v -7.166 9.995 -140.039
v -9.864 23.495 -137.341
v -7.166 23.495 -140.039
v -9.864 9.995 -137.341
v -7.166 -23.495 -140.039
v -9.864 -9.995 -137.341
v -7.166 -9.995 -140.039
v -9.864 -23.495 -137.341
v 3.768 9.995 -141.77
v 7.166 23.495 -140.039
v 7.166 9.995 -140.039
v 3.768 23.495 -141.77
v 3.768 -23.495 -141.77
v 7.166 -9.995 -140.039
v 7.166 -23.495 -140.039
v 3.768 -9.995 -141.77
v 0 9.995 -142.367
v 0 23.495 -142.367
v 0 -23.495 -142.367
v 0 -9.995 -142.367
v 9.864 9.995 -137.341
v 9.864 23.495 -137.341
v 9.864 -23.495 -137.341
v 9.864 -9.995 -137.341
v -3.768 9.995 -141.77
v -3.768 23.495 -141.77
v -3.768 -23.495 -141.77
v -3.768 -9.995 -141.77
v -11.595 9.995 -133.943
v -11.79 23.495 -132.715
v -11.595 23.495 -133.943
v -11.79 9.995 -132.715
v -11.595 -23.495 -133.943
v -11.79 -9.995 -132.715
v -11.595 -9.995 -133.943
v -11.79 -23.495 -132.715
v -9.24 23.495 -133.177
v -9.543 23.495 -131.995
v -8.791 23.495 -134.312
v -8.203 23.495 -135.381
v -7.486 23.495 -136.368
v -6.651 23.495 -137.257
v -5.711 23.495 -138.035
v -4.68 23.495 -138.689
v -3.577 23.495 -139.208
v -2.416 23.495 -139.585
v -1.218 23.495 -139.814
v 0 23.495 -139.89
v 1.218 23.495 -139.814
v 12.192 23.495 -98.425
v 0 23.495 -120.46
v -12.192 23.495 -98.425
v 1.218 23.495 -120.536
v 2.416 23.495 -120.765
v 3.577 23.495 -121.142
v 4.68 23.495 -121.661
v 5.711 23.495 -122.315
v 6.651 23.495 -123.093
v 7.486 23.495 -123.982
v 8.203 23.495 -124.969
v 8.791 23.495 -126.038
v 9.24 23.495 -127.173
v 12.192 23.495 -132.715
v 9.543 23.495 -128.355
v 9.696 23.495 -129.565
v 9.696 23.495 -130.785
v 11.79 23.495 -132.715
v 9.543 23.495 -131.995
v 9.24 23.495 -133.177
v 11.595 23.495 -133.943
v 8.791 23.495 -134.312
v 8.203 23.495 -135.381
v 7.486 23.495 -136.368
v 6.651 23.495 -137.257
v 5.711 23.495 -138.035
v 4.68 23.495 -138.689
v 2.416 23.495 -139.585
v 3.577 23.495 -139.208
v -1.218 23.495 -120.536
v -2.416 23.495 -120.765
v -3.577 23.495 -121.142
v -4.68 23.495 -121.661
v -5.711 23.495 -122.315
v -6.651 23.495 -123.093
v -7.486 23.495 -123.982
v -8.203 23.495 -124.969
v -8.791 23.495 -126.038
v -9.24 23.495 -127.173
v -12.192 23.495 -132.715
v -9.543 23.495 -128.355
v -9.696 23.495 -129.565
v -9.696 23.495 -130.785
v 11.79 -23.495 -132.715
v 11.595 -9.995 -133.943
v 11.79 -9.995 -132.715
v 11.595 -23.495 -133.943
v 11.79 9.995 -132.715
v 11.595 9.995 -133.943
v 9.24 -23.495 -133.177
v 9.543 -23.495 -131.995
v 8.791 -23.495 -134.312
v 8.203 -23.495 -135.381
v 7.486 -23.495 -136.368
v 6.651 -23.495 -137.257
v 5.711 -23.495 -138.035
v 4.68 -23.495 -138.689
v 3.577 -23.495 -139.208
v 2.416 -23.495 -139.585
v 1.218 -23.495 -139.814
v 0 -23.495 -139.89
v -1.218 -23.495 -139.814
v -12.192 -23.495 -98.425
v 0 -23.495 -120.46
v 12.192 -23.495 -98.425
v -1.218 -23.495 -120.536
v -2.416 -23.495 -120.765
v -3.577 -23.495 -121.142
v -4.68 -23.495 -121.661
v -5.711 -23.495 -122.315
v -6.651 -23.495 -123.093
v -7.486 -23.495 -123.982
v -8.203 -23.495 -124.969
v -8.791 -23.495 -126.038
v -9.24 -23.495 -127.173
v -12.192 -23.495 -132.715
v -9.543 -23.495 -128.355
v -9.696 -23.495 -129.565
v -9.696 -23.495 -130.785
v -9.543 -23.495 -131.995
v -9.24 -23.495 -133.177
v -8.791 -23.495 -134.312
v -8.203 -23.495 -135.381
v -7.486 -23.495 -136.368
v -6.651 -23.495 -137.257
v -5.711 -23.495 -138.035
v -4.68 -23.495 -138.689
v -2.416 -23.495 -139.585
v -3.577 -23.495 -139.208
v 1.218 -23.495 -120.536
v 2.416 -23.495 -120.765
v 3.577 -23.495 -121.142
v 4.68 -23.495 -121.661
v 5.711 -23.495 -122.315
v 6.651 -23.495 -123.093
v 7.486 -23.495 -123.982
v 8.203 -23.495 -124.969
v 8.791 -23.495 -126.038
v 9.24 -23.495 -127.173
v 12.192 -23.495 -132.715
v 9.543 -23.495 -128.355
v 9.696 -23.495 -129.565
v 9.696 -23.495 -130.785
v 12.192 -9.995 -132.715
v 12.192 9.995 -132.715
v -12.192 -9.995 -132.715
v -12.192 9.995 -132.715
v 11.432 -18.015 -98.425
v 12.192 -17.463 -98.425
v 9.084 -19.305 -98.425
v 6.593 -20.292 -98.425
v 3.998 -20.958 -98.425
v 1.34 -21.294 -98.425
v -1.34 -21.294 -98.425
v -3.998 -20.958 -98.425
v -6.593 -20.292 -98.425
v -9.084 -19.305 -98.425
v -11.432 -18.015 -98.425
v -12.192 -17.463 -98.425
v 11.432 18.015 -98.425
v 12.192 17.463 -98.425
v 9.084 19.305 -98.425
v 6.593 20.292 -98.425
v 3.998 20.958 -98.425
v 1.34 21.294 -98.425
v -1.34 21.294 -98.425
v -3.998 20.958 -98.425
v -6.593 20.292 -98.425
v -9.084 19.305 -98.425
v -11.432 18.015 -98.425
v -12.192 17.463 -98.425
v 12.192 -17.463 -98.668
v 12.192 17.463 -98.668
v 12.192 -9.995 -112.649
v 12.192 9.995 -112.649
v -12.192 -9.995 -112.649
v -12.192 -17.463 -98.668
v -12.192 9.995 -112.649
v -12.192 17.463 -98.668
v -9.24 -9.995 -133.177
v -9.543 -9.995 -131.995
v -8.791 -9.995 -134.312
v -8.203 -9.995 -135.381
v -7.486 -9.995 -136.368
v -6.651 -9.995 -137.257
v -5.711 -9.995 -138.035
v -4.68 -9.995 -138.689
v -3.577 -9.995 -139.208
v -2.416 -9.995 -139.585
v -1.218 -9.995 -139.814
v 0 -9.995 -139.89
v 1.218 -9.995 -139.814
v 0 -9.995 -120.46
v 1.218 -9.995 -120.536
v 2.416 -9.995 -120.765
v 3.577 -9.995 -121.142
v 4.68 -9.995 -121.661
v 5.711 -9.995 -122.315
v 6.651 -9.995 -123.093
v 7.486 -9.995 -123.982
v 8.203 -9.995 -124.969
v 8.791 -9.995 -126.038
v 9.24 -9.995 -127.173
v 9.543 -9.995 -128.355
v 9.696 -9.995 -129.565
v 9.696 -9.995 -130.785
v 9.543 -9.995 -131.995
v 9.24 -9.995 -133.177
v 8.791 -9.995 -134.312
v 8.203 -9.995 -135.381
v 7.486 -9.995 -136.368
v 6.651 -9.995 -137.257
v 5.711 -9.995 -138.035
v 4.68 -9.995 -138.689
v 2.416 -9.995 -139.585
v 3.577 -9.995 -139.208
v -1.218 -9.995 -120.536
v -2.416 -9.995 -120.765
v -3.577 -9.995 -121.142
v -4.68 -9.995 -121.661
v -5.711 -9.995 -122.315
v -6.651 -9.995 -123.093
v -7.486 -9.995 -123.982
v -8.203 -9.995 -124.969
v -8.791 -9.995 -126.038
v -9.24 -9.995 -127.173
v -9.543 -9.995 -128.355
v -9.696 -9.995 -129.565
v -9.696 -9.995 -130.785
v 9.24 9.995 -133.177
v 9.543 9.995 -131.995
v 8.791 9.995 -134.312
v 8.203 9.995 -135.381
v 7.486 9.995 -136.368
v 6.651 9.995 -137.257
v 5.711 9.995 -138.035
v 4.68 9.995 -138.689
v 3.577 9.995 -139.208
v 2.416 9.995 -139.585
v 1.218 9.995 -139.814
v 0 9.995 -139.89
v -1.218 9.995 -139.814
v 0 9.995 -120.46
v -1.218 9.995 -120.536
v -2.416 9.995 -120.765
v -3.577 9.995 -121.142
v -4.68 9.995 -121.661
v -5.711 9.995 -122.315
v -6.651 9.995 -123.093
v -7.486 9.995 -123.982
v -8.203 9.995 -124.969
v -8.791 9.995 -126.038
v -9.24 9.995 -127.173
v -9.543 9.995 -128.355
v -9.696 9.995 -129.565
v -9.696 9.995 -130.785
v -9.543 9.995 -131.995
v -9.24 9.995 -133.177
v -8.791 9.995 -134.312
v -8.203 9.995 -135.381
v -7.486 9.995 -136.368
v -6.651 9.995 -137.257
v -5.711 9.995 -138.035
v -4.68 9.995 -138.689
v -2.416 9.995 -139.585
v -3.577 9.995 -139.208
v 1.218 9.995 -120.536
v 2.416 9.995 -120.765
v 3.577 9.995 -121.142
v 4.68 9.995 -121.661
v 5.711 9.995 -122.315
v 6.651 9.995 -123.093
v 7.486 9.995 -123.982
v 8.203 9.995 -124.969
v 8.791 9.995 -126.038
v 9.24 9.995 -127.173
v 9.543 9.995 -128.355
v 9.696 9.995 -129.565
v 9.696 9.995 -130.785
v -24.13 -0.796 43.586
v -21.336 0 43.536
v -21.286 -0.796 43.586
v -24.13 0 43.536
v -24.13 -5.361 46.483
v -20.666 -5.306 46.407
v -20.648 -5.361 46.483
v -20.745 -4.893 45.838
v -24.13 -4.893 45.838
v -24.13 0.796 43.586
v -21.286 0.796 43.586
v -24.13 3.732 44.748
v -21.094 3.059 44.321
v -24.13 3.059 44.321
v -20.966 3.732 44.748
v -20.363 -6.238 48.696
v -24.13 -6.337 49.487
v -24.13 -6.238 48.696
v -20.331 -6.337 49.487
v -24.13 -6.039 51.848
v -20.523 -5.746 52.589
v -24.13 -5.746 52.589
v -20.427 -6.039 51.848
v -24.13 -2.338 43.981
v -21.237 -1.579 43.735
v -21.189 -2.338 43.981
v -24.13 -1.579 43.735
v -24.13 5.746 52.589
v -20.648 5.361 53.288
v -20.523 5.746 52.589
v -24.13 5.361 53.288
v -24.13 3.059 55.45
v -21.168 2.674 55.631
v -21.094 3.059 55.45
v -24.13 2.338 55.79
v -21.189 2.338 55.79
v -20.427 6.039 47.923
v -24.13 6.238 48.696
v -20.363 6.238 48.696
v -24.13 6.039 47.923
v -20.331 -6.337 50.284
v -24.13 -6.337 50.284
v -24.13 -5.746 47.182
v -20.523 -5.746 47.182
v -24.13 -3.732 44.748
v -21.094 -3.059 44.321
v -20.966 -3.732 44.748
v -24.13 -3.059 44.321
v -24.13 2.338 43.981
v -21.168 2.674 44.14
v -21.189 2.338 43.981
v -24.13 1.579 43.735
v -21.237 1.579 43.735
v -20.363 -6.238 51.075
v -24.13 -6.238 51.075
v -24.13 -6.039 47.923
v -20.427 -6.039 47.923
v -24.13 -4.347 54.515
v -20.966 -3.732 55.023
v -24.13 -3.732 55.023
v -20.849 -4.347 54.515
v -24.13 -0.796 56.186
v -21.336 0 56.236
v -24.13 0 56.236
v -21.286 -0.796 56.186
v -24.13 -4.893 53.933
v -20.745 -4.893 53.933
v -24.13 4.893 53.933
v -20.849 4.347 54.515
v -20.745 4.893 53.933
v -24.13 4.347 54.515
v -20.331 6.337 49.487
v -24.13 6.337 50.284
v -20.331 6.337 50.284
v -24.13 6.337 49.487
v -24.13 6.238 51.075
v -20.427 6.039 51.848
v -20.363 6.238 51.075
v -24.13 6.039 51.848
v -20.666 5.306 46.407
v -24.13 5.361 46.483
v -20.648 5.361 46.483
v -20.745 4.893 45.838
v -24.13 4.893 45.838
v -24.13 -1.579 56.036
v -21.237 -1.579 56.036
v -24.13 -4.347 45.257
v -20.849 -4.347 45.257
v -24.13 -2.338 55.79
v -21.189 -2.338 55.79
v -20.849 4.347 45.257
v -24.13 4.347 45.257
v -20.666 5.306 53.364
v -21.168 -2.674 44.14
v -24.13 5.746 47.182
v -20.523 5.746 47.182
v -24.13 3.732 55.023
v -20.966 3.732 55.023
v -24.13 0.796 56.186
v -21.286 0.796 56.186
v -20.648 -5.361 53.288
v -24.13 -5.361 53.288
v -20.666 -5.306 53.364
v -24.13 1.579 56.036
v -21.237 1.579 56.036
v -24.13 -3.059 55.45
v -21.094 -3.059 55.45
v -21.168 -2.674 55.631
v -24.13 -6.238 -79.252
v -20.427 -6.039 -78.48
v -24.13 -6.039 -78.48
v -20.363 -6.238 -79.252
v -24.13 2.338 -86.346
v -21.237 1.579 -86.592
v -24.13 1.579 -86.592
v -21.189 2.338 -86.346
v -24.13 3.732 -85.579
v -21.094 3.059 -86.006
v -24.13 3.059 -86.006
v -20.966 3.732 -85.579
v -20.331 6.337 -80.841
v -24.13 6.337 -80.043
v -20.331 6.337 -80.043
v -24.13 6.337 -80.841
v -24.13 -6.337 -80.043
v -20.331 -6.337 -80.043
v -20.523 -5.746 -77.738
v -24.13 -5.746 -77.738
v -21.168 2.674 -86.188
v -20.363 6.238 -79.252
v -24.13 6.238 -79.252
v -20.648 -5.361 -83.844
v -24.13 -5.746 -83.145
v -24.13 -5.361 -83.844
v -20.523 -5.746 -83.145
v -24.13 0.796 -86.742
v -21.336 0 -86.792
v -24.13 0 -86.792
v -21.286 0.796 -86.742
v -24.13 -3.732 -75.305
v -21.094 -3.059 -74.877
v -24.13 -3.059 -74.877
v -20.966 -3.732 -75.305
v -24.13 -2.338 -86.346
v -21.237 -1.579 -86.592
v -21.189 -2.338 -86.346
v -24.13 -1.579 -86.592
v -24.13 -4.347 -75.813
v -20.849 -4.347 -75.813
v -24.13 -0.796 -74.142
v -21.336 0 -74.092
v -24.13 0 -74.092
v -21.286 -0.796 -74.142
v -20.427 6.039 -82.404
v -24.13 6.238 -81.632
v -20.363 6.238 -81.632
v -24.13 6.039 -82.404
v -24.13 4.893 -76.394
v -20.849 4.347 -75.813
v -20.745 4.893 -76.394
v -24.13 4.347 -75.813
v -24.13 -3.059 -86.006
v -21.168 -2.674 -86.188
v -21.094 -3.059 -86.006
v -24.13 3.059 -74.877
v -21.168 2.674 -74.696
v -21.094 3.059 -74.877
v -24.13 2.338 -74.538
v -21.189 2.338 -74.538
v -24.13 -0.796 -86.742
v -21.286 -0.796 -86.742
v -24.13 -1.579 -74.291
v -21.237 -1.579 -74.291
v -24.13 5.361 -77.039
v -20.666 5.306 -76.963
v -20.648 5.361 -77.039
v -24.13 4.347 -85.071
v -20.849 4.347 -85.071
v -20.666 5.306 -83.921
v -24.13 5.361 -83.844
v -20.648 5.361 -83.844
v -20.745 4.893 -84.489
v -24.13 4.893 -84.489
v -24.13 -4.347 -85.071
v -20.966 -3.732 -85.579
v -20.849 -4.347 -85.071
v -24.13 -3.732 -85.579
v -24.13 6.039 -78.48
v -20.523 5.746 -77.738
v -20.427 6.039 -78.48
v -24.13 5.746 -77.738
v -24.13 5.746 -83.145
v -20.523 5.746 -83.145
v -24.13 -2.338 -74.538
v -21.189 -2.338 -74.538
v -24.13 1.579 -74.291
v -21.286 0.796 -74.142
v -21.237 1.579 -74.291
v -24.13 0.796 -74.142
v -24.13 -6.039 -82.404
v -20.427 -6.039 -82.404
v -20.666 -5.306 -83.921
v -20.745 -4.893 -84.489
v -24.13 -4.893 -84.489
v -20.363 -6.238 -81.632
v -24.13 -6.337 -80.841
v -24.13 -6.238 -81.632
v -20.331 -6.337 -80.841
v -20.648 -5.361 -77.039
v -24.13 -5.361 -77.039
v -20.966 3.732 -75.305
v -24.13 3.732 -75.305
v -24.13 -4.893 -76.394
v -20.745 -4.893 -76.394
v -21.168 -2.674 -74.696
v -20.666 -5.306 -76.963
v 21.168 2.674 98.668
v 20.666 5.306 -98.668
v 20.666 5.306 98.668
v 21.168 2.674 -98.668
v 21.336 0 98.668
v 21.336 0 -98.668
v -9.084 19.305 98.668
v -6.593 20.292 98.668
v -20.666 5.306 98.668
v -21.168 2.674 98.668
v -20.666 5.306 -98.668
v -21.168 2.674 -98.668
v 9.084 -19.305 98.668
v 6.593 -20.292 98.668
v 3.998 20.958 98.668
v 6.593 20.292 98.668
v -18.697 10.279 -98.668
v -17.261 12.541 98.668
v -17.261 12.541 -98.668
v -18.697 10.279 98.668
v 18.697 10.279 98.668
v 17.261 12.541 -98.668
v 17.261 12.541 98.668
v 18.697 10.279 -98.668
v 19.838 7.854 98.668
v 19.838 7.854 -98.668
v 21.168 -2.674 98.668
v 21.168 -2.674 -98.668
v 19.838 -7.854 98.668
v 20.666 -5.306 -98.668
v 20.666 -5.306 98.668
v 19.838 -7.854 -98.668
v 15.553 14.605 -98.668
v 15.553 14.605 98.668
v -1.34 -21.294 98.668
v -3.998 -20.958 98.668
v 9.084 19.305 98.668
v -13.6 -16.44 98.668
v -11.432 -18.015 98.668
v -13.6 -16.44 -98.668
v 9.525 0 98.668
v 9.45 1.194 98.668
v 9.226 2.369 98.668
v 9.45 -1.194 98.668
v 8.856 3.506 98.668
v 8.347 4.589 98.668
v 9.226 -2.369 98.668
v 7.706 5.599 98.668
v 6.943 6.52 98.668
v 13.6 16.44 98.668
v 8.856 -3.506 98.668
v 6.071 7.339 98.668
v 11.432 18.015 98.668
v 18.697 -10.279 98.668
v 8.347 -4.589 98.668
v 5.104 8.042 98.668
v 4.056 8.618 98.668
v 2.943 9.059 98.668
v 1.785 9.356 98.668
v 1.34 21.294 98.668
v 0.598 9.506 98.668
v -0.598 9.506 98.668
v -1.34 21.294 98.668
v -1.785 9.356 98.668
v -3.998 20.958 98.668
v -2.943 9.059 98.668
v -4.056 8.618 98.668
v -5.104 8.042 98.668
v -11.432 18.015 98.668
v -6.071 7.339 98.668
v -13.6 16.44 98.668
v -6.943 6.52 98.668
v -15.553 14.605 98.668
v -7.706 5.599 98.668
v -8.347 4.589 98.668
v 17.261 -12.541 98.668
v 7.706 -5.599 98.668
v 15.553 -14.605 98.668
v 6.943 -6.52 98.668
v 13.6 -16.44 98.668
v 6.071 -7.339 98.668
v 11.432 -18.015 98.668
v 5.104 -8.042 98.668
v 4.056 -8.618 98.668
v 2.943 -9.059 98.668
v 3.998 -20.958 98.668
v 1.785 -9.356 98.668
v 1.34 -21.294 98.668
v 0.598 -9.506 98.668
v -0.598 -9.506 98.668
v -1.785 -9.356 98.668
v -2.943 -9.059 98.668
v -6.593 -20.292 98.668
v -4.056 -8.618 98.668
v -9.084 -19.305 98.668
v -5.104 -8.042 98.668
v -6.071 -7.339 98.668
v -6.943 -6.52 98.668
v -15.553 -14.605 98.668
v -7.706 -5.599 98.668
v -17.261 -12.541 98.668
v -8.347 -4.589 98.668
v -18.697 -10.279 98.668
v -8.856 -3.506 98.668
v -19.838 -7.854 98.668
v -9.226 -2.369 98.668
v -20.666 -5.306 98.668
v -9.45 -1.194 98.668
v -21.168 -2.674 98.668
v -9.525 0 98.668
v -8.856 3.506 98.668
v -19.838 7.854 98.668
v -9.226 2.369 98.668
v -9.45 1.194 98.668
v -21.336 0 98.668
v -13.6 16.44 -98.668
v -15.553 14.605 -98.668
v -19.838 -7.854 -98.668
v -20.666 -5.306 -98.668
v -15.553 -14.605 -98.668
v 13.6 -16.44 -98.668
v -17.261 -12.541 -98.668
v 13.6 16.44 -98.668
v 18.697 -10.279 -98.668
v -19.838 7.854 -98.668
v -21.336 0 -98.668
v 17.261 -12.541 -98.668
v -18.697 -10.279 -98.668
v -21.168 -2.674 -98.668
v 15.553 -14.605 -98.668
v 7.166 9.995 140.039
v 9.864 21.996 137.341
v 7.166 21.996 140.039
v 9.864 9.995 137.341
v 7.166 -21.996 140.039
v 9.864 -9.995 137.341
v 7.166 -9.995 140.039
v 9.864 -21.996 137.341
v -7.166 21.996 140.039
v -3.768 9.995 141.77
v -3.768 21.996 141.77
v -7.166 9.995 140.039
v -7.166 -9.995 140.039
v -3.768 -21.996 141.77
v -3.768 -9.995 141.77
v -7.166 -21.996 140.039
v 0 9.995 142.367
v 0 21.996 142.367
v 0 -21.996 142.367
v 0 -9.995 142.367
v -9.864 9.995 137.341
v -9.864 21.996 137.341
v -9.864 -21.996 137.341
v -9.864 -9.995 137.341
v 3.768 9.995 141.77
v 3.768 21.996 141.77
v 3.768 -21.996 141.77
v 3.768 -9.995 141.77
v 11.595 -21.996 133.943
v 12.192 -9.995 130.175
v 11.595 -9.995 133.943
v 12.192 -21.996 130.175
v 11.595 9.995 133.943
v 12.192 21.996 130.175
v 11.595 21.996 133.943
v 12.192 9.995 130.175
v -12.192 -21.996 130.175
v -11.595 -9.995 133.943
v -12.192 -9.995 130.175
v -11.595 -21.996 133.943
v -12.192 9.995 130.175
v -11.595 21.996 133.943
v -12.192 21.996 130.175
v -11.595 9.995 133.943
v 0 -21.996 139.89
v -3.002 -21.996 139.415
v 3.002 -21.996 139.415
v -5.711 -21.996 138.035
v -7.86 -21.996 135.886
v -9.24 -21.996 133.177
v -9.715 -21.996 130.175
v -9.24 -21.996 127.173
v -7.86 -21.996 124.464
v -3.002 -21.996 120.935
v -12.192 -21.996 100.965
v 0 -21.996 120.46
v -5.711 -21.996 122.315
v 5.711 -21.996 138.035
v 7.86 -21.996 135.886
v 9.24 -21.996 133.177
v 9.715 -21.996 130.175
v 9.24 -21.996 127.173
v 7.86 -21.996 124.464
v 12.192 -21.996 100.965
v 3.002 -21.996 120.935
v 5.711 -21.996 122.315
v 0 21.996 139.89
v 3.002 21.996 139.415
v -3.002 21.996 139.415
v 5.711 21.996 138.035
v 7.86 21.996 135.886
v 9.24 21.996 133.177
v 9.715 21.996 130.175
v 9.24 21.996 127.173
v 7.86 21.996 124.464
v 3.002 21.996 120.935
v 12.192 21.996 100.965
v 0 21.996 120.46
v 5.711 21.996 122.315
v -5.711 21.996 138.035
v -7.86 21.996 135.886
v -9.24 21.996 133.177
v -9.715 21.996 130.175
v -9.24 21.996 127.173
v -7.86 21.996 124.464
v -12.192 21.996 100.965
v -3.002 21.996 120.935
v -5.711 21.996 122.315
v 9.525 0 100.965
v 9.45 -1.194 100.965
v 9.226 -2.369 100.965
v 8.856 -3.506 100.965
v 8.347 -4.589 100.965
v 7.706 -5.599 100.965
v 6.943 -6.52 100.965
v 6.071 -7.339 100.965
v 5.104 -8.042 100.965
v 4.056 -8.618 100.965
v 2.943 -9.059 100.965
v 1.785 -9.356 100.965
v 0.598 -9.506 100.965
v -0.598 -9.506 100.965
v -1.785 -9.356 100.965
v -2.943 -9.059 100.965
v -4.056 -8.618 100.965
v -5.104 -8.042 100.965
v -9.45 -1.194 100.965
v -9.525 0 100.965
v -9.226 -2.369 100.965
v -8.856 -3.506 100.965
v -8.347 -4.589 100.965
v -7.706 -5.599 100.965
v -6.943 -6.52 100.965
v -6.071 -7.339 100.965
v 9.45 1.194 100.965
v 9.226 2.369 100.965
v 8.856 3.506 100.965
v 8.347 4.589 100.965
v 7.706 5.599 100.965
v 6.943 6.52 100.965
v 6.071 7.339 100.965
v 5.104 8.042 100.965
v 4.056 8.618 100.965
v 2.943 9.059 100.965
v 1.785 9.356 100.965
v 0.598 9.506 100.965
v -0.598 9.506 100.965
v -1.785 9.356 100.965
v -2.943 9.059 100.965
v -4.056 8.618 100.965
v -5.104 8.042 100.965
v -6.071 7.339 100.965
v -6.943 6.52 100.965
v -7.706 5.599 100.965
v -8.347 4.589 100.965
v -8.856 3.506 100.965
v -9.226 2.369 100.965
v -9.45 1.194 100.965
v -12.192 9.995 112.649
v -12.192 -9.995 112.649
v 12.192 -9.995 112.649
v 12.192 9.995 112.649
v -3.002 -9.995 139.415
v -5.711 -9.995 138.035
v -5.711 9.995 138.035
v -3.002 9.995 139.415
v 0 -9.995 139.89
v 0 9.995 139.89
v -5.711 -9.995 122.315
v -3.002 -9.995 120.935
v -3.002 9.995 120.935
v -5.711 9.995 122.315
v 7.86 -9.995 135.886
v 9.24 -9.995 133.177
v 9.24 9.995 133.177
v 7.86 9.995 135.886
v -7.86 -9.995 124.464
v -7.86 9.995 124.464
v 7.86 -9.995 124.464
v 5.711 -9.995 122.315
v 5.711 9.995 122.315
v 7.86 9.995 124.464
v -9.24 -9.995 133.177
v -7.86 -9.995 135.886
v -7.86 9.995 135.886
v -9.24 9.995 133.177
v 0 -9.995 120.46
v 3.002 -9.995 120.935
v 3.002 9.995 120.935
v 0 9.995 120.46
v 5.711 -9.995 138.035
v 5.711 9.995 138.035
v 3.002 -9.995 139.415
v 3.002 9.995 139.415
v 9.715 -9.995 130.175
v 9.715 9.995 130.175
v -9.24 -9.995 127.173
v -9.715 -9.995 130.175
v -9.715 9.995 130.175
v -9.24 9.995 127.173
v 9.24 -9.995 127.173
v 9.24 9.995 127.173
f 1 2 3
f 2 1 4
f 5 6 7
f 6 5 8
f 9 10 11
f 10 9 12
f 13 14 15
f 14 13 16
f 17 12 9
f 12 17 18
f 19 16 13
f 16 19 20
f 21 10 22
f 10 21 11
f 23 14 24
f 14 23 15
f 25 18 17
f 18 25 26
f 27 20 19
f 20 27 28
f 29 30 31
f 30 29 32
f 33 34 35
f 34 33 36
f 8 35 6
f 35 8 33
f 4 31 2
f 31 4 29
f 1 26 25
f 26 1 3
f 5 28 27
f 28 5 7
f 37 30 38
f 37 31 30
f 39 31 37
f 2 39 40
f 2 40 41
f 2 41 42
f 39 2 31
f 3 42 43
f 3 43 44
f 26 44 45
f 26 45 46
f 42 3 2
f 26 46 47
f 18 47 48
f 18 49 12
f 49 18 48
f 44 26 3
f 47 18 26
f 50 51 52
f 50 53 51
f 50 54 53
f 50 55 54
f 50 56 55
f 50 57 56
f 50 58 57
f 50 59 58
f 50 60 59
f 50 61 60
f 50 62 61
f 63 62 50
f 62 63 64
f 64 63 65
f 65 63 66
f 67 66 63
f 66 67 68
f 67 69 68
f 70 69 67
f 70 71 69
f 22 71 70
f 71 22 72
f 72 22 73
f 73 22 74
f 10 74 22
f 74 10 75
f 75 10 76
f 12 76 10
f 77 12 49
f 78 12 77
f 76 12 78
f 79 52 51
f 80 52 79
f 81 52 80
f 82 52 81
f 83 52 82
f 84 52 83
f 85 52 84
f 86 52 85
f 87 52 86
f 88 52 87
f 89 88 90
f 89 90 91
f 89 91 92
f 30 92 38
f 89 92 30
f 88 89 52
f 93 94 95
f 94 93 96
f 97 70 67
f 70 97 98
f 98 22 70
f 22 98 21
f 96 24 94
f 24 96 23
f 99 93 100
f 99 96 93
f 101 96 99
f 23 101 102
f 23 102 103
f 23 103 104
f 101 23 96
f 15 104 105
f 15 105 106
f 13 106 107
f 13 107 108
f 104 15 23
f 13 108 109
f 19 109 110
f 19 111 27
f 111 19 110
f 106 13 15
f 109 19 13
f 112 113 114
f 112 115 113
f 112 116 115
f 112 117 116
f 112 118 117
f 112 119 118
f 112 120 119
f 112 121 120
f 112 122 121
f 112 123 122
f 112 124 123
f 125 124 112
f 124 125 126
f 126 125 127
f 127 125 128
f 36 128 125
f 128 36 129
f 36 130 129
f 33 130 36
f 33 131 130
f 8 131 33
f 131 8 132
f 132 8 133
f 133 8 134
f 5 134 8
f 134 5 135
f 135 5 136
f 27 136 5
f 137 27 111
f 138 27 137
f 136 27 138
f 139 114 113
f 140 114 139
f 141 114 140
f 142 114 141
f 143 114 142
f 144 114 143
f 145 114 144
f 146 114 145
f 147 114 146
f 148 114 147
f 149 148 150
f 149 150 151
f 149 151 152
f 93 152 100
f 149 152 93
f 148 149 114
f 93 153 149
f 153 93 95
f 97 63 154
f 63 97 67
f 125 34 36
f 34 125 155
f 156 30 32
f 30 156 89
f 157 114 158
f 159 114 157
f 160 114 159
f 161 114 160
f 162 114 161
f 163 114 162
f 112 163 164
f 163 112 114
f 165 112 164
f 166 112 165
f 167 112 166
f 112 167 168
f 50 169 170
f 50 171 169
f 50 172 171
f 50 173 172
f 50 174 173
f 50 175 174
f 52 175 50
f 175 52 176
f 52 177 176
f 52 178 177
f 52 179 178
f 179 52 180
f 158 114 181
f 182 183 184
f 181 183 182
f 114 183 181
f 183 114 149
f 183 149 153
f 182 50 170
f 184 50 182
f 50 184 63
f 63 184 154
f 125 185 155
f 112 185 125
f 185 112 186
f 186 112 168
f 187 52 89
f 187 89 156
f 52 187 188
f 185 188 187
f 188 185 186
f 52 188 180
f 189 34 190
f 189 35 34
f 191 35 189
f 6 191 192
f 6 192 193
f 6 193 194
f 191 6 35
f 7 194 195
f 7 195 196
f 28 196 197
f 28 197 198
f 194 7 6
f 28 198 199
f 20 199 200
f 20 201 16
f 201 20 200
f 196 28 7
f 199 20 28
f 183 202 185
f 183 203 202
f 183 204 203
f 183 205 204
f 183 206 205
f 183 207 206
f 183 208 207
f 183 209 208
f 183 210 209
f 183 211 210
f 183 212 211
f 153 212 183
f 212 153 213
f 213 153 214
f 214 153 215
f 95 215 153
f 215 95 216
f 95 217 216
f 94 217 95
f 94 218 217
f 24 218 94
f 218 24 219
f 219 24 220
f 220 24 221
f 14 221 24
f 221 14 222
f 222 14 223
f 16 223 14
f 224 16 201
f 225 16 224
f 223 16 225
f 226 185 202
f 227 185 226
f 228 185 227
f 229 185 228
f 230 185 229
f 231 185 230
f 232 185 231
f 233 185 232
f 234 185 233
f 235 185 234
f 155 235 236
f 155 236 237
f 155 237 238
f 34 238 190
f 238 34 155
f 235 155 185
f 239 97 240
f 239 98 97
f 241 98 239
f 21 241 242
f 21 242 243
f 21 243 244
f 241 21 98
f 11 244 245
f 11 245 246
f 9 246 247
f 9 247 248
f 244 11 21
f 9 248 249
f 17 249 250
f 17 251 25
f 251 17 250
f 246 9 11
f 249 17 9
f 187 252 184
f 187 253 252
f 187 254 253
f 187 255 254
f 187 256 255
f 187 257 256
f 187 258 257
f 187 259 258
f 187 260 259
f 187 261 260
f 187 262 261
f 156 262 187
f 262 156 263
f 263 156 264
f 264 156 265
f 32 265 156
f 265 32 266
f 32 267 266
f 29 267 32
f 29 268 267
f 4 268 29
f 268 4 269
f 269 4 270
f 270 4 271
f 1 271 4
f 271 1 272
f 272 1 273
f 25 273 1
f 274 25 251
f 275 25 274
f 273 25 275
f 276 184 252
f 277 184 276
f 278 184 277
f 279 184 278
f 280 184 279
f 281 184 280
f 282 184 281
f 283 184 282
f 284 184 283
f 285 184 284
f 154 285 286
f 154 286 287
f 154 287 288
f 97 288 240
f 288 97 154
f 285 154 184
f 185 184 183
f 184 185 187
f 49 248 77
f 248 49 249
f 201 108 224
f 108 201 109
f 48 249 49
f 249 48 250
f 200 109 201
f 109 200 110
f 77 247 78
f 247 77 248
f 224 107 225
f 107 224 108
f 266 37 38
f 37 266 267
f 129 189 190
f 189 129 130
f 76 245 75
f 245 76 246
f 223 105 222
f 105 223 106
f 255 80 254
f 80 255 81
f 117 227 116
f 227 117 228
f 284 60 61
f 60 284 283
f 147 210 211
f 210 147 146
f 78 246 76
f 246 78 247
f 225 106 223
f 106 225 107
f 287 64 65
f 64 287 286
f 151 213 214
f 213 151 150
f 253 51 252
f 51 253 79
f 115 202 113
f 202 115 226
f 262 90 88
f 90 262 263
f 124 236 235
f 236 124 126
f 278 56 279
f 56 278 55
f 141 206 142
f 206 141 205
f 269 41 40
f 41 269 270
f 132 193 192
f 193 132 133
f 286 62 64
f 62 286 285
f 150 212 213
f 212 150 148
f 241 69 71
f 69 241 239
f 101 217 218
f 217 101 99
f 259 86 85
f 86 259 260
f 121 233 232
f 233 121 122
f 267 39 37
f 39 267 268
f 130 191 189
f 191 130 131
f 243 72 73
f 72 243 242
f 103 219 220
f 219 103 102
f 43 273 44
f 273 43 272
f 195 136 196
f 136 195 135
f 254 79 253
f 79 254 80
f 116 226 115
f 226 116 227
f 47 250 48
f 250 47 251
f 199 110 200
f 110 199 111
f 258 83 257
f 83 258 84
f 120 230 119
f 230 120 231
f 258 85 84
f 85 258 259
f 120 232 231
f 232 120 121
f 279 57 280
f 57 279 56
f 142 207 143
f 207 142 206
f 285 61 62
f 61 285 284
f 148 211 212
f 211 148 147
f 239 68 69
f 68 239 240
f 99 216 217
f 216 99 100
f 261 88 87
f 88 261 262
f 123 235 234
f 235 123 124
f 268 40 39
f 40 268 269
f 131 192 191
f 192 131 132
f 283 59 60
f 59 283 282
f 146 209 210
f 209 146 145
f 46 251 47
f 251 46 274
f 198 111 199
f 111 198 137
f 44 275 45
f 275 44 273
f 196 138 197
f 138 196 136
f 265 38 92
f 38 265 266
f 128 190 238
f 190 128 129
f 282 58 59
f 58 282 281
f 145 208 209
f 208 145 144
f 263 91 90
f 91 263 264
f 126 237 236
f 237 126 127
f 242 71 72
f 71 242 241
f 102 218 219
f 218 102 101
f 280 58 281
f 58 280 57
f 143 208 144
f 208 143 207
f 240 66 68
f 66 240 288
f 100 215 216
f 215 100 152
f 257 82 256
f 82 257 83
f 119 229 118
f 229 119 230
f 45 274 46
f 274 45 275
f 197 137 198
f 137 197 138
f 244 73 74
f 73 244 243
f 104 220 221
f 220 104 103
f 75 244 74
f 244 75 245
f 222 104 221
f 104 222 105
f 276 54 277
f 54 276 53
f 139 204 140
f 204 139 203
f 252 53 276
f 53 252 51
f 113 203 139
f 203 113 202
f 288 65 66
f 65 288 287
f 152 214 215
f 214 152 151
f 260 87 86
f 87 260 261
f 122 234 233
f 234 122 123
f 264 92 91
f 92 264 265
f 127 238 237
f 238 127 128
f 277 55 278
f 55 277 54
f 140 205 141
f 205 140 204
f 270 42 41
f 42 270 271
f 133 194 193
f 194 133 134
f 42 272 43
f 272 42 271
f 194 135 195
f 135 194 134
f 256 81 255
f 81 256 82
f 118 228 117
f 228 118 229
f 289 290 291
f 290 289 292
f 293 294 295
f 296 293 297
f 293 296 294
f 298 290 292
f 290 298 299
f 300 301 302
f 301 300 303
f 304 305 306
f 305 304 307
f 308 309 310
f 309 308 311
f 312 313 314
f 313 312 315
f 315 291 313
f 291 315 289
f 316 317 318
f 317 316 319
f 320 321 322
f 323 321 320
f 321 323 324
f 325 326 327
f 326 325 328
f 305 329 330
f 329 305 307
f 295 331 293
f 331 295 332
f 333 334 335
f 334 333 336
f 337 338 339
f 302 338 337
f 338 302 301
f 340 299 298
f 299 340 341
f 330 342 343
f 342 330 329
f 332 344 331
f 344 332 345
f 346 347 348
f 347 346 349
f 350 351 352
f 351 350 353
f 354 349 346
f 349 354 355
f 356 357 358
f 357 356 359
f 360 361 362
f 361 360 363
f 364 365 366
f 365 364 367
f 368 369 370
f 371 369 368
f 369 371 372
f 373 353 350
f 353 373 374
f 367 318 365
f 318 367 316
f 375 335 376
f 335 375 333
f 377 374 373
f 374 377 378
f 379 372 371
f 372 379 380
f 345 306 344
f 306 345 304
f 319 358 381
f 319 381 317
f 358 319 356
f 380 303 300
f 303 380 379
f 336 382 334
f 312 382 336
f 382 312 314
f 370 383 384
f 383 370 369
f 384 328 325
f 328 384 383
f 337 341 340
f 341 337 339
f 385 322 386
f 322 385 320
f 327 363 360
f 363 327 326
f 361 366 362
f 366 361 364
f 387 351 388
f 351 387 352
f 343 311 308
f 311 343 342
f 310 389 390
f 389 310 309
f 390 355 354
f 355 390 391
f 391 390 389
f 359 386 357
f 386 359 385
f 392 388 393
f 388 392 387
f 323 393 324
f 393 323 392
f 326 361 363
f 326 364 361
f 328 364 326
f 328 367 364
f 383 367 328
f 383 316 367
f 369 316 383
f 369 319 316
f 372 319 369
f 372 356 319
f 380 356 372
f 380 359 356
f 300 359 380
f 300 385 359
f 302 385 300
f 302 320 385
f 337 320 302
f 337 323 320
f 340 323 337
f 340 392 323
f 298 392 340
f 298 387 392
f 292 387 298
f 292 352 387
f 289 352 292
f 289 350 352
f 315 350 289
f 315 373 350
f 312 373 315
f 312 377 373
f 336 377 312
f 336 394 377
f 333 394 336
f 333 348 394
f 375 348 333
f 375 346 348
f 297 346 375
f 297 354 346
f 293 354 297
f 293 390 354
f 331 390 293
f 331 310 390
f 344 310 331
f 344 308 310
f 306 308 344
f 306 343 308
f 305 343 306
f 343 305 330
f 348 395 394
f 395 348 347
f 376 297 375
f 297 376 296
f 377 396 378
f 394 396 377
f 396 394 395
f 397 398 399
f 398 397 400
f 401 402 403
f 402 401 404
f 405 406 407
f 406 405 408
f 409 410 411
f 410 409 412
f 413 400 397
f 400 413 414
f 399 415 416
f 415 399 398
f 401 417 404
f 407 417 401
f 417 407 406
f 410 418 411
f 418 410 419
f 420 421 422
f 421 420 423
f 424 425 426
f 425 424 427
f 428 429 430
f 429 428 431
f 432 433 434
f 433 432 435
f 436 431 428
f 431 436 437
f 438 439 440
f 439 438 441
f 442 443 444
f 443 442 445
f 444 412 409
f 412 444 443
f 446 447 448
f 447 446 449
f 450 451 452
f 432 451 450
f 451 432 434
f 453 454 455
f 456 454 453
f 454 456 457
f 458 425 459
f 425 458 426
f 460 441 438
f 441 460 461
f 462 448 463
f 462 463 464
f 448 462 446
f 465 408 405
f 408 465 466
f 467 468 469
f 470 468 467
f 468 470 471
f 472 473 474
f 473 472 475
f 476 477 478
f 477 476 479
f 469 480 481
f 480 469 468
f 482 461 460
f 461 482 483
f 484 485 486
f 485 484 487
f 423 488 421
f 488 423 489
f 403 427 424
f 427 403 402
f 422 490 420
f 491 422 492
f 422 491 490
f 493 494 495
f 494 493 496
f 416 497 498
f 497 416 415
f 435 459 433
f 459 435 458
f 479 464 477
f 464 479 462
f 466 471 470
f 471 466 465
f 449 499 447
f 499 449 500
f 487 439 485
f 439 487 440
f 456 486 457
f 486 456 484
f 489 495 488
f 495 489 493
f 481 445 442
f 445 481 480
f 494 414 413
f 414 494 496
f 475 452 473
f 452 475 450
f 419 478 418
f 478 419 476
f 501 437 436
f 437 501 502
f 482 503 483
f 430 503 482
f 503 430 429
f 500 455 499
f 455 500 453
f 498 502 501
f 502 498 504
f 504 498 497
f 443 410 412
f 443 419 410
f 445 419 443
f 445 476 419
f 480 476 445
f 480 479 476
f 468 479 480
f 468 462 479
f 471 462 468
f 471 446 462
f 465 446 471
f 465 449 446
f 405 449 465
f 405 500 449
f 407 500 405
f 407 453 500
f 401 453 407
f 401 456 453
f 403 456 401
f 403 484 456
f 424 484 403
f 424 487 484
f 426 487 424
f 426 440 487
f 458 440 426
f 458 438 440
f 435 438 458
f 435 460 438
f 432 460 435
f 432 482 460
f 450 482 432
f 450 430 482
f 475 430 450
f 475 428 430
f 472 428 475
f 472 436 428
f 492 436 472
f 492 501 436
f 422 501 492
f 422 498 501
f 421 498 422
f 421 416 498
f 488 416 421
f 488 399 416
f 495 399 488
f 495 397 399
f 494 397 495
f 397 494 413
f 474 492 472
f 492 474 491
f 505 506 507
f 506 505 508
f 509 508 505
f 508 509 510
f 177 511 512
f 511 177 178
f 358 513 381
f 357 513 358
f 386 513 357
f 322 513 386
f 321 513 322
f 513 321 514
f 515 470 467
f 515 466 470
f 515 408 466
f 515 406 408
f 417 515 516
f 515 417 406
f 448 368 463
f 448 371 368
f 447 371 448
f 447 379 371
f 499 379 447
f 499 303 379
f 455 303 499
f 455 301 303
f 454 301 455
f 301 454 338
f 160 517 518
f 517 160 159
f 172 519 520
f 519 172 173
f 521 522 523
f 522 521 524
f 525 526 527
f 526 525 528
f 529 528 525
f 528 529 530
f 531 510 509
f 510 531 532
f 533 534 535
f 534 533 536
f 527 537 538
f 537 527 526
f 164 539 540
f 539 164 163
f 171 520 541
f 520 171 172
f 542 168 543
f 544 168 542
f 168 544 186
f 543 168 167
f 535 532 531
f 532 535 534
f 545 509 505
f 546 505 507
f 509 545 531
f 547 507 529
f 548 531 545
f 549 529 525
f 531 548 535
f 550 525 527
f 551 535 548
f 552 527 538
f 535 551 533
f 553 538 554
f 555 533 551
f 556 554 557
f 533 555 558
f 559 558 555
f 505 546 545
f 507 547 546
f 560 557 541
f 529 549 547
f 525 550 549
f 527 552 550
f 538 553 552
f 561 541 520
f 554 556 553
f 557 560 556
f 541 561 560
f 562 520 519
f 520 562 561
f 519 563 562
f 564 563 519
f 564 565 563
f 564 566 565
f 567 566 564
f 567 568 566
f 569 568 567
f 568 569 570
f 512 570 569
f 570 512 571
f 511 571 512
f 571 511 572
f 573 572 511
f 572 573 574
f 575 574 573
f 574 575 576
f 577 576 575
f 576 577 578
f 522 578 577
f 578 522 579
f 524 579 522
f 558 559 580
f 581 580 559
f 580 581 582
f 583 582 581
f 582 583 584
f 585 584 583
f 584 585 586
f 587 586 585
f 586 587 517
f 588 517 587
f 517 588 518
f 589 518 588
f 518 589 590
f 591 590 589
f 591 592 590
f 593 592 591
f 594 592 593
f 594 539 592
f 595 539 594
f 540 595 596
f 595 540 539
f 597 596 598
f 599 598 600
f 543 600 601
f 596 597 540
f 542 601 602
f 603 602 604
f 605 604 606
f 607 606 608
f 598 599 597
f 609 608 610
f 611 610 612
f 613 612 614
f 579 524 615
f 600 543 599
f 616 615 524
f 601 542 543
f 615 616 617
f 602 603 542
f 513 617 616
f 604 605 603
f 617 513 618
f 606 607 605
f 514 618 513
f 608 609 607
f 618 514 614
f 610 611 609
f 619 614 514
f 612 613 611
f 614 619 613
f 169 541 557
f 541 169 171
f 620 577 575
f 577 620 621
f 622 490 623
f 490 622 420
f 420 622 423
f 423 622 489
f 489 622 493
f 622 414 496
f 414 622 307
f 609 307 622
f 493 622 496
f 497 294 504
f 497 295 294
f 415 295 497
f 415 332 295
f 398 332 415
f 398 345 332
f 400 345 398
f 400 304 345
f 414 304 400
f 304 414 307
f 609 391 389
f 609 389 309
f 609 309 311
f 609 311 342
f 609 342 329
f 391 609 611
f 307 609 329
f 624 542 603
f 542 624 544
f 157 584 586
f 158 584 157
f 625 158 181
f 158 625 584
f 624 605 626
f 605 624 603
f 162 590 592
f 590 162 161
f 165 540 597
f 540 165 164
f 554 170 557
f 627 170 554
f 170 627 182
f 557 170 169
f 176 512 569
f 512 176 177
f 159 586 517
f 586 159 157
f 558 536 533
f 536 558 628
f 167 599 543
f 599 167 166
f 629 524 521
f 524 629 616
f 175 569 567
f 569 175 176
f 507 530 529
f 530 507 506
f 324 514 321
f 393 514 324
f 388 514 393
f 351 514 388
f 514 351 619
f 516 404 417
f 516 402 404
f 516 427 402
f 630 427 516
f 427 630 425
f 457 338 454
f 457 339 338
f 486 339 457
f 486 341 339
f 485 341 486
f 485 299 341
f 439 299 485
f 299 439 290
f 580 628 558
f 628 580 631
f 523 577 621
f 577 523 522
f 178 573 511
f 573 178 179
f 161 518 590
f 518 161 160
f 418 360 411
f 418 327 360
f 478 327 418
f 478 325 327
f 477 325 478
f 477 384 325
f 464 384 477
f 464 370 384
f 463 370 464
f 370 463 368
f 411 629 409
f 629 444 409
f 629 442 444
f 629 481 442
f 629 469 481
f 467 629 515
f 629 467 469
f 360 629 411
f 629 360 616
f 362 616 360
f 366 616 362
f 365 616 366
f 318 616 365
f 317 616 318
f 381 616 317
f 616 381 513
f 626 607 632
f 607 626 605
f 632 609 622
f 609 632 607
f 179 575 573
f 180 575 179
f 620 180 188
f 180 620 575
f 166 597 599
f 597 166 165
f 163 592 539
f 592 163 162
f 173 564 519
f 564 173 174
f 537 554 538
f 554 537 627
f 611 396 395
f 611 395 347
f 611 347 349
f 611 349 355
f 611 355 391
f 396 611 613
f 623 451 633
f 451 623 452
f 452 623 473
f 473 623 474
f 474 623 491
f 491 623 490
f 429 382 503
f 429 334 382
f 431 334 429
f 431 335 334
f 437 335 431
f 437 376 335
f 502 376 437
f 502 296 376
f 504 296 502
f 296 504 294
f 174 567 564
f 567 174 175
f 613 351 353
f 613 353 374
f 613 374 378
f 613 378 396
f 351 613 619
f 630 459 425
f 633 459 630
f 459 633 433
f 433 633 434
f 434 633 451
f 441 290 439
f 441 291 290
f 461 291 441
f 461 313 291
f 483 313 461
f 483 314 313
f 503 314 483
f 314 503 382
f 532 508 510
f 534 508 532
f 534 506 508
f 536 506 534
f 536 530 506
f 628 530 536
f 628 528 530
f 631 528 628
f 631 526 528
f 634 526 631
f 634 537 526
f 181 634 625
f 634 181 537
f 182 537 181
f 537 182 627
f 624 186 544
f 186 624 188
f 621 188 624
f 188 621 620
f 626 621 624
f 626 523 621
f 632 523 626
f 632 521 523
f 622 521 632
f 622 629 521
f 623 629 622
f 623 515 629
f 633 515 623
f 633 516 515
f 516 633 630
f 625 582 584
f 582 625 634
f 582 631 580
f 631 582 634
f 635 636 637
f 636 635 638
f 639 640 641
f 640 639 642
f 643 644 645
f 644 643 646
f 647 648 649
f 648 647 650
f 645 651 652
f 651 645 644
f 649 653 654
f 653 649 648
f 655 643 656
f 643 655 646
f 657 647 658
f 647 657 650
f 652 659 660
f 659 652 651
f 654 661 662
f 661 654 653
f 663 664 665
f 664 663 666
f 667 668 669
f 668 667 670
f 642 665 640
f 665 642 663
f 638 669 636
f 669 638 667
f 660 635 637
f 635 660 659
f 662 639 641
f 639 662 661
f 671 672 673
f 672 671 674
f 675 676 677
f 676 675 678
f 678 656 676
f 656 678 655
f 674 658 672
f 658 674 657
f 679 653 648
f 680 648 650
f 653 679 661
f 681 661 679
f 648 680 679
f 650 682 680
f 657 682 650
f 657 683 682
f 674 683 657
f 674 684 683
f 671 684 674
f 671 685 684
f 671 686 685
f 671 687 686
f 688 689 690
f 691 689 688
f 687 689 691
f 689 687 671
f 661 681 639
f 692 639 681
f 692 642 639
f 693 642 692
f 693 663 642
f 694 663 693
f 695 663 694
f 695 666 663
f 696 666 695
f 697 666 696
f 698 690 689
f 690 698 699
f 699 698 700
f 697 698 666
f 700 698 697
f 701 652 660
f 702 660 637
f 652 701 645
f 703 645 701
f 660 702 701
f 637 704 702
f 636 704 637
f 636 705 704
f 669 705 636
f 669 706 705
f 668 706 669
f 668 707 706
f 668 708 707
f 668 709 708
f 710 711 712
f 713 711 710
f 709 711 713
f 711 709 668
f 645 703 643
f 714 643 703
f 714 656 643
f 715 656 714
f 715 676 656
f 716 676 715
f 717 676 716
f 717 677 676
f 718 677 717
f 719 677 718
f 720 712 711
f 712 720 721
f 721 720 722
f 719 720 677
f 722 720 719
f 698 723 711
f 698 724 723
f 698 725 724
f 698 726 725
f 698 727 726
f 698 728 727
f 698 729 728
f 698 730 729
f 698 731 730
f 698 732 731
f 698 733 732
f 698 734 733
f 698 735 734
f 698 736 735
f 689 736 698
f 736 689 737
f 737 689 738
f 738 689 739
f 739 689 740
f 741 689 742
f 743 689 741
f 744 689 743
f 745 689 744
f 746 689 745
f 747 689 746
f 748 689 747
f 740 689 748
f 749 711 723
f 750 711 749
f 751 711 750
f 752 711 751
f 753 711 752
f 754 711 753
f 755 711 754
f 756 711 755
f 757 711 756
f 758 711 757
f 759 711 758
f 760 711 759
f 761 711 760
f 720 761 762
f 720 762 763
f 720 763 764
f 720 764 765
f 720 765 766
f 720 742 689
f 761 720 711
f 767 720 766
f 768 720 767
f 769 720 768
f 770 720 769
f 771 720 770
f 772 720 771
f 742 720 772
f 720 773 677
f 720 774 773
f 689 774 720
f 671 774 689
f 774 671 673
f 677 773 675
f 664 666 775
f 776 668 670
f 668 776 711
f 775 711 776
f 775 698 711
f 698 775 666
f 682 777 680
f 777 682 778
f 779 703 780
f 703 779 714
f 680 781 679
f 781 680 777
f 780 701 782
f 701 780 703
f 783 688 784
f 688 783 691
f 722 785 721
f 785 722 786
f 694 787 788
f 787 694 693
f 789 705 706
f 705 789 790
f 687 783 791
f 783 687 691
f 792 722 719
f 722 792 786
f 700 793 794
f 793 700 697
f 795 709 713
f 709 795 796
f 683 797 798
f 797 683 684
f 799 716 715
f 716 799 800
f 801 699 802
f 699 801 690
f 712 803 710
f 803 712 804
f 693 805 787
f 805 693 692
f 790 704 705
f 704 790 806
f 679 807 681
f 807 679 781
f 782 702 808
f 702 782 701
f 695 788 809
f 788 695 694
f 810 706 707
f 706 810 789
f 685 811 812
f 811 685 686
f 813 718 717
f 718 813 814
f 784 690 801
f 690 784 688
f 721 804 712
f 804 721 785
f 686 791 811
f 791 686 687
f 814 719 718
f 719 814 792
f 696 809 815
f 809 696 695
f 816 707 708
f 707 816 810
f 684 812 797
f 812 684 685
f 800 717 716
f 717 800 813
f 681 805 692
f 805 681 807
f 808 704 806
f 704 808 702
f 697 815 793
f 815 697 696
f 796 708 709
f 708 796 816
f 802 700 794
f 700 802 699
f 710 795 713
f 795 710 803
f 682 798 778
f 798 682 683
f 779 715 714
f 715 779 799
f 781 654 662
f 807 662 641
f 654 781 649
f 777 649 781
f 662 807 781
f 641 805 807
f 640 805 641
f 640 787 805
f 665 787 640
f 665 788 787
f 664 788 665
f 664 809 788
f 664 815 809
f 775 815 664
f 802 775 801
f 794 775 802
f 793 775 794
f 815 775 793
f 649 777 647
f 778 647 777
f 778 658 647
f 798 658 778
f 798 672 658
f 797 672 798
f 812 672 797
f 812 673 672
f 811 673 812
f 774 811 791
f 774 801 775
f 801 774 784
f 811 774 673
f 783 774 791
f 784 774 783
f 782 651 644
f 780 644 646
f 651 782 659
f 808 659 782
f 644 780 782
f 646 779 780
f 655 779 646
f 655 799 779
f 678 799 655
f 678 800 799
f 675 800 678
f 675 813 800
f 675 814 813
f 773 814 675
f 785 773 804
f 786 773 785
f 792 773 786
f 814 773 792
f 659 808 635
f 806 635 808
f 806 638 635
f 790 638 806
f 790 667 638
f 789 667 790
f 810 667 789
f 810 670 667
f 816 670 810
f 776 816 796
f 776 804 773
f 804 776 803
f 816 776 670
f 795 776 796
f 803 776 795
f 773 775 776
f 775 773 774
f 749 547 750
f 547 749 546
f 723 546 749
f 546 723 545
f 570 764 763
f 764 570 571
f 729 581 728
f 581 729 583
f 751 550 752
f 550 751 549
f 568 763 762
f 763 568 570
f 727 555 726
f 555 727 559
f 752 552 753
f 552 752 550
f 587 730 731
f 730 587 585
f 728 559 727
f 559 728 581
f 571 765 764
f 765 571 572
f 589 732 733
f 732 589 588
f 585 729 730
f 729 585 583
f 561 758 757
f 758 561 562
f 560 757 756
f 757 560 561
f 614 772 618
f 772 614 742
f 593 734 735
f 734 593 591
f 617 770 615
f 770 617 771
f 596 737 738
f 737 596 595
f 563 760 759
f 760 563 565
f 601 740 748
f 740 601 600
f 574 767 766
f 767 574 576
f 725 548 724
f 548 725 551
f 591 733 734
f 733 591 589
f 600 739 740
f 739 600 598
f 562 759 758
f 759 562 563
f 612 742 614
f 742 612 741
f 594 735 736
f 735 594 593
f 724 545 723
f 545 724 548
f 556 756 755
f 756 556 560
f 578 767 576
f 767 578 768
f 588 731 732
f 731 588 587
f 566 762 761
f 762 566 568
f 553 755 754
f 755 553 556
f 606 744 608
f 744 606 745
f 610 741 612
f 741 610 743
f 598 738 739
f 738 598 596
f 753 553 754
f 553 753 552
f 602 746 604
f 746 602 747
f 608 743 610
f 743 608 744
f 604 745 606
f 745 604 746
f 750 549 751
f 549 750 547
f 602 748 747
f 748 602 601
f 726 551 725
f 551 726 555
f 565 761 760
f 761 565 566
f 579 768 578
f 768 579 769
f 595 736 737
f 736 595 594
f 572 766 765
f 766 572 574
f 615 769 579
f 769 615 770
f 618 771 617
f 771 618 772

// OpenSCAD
/*
About the model: This is a simplified model of a hydraulc cylinder, with key properties to consider when designing and CADing you own model. It allows you to look into a catalog and change parameters, based on the model you select.
The refernece used to construct this specific model is the "Chieve WC Wlded Cylinders", available in 2012 Catalog 280 provided by Bailey.

How to change it:
1) You can directly change it here, or
2) Enable the customizer feature of openscad
*/

/* [General Parameters]*/
unit=25.4;
extended=false;
bore=1.5;
stroke=5;
//Length of the cylinder
a=10.250;
/* [Cylinder Body Parameters] */
b=0.18;
// rod diameter
d=0.75;
/*[rod mechanical link parameters]*/
h=0.787;
l=0.96;
r=0.765;
g=1.732;
j=1.15;
/*[cylinder mechanical link parameters]*/
o=0.787;
e=1.850;
n=0.9;
r_c_h=j+l;
/*[Distance of hydraulic ports]*/
k=2.125;
m=0.922;

/*[Hidden]*/
//Z axis connection
// Rod connection related variable
z=g-h/2;
//size of the body cylinder
body=a-m-j;//*[] put the variables
y=a-(n+n);


module main_mod(){

// Rod Connector construction
module rod_connector(args) {
	module m001(args) {
		cylinder(d=l, h=g, center=true, $fn = 20 );
		translate([-j/2, 0, 0]){
			/* cube(size=[j, l, g], center=true); */
			cube(size=[j, l, g], center=true);

		}

	}
	difference(){
		difference() {
			m001();
			cylinder(d=r, h=z+10, center=true, $fn = 20);
		}
		cube(size=[j+j*0.2, j+j, h], center=true);
	}

}
// Lower Body connector *[] call within cylinder body module
module low_connector(){
	difference(){
	difference(){
	union(){
		cylinder(d=l, h=e, center=true, $fn = 20 );
		translate([-j/2, 0, 0])
			/* cube(size=[j, l, g], center=true); */
			cube(size=[n+n*0.5, l, e], center=true);
		}
		cube(size=[j+j*0.2, j+j, h], center=true);
	}
	cylinder(d=r, h=z+10, center=true, $fn=50);
	}

}

/*Body Cylinder connector
* [] related variables h, e
* [] Build this
*/

// cylinder rod
module rod(args) {
	translate([0,0,(body-stroke)/2])
	cylinder(d=d, h=stroke, center=true, $fn=50);
	translate([0,0,(body+m+j)/2])rotate([90,270,0])rod_connector();
}

// cylinder body
module body(args) {
	//hydraulic ports construction
	module h_ports(args) {
		color("red")
		rotate([0,90,0])
		translate([0, 0, -bore/2])
		cylinder(d=0.5, h=0.4, center=true, $fn=50);
		}
		translate([0,0,body/2-k])h_ports();
		translate([0,0,-body/2+m])h_ports();
		// main body cylinder
		cylinder(d=bore+b, h=body-body*0.05, center=true, $fn=50);
		translate([0,0,-(a/2)])rotate([90,90,0])low_connector();
}


// Construct full cylinder cylinder_body
difference() {
	color("red")body();
	translate([-10, 0, -10]) {
		/* cube([20,20,a+stroke]); */
	}

}

if (extended==true){
	translate([0,0,stroke])color("lime")rod();
}
else{
	translate([0,0,0])color("lime")rod();
}

}
//Convert to proper units
scale([unit, unit, unit]) {
	main_mod();
}
